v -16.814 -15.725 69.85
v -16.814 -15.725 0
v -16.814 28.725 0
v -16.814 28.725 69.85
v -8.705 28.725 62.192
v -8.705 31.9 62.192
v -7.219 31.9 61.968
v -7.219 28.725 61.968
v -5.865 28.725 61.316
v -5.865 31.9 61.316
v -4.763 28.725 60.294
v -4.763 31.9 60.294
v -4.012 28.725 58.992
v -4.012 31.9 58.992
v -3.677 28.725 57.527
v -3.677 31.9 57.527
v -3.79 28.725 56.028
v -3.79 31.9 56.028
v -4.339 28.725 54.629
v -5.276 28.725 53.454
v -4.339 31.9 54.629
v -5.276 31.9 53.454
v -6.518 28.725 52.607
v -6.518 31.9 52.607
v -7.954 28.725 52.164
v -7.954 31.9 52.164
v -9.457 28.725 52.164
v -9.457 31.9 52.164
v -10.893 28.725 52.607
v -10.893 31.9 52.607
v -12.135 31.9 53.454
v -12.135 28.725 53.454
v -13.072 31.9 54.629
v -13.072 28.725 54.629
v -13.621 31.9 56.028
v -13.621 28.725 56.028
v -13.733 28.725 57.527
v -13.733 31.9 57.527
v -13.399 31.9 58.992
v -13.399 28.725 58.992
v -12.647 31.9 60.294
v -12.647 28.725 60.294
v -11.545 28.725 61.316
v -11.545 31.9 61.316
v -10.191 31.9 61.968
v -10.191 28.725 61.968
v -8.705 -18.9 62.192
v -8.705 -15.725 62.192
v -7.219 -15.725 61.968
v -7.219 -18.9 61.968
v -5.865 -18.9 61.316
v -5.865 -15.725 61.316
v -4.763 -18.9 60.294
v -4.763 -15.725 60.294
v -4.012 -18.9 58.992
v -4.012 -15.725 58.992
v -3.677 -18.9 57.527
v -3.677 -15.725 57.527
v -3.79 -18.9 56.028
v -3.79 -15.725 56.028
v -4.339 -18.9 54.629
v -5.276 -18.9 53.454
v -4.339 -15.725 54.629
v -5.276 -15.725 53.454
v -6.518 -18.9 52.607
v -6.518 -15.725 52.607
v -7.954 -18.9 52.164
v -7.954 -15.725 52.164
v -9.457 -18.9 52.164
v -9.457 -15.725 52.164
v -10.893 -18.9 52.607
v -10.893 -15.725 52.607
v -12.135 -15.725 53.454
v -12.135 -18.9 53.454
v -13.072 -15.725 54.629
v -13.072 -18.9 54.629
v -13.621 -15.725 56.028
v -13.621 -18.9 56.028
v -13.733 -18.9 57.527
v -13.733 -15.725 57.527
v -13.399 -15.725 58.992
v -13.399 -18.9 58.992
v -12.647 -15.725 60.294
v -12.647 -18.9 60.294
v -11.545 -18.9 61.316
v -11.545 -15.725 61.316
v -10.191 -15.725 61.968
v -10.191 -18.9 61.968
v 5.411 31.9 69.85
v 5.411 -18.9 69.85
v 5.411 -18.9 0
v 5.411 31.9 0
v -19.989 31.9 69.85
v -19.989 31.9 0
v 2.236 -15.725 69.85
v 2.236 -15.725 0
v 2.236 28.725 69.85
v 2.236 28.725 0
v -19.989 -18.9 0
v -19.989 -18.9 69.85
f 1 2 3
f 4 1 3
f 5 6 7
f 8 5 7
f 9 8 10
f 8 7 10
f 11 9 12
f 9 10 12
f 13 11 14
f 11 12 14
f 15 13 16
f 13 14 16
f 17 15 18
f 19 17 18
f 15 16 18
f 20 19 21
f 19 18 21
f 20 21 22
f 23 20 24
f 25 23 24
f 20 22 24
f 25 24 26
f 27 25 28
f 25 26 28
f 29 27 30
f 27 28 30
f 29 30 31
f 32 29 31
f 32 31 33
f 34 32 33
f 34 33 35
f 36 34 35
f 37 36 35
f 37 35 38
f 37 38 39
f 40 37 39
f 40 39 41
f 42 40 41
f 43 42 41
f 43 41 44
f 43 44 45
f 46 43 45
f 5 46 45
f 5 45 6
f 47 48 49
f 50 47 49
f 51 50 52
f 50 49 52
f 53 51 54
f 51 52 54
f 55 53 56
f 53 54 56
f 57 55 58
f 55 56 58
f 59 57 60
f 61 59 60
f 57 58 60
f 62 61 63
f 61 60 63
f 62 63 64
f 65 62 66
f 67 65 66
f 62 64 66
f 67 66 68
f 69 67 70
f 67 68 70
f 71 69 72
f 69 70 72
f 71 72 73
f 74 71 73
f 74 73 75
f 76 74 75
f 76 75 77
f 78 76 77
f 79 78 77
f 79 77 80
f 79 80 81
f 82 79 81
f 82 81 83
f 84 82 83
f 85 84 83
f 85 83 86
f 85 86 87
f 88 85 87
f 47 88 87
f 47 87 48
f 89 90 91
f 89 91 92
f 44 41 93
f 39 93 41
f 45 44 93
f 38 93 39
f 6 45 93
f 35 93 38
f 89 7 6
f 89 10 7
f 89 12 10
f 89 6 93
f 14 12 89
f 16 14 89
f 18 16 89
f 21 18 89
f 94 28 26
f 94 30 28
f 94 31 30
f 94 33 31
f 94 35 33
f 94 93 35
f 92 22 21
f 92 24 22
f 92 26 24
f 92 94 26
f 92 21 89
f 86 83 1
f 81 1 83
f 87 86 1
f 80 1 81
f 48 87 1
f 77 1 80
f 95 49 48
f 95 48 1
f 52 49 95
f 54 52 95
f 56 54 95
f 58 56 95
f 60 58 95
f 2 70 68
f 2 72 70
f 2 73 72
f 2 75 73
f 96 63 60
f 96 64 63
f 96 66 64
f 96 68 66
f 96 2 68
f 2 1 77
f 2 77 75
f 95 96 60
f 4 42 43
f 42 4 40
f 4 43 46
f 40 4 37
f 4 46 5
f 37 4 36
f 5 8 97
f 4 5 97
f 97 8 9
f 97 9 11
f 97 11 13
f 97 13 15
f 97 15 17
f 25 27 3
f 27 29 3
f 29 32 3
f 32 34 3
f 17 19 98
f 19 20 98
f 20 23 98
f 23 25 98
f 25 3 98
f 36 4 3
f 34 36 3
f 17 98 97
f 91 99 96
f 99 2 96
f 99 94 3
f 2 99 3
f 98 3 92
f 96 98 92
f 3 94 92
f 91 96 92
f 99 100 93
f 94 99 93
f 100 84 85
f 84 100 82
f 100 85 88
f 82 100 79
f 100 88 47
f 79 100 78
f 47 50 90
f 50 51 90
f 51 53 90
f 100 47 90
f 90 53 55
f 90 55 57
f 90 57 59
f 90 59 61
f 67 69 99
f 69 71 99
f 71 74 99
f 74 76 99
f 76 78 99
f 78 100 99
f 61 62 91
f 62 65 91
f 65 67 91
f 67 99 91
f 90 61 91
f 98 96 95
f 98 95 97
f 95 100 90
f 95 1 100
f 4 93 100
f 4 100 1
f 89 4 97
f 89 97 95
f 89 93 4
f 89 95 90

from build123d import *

# Parameters (mm, degrees)
SKETCH1_W           = 25.4
SKETCH1_H           = 50.8
SKETCH1_W_2         = 19.05
SKETCH1_H_2         = 44.45
BOSS_EXTRUDE1_DEPTH = 69.85
CUT_EXTRUDE2_REACH  = 90.652
SKETCH4_R           = 5.0419


with BuildPart() as part:
    # Sketch1 → Boss-Extrude1 (new body)
    with BuildSketch(Plane.XY):
        with Locations((-7.289349112, 6.500295858)):
            Rectangle(SKETCH1_W, SKETCH1_H)
        with Locations((-7.289349112, 6.500295858)):
            Rectangle(SKETCH1_W_2, SKETCH1_H_2, mode=Mode.SUBTRACT)
    extrude(amount=BOSS_EXTRUDE1_DEPTH)

    # Cut-Extrude2: up to this face of the body (flat: up to its plane)
    cut_extrude2_end = Plane(part.part.faces().sort_by_distance((-7.289349112, -18.899704142, 34.925))[0])
    # Sketch4 → Cut-Extrude2 (cut, up to the picked face)
    with BuildSketch(Plane(origin=(0, 31.900295858, 0), x_dir=(1, 0, 0), z_dir=(0, 1, 0)), mode=Mode.PRIVATE) as cut_extrude2_sk1:
        with Locations(Location((-8.705288844, -57.15, 0), (0, 0, 270))):
            Circle(SKETCH4_R)
    cut_extrude2_tool1 = split(extrude(cut_extrude2_sk1.sketch, amount=-CUT_EXTRUDE2_REACH, mode=Mode.PRIVATE), bisect_by=cut_extrude2_end, keep=Keep.BOTH, mode=Mode.PRIVATE)
    add(cut_extrude2_tool1.solids().sort_by(Axis((-8.705289, 31.900296, 57.15), (0, -1, 0)))[0], mode=Mode.SUBTRACT)


solid = part.part
